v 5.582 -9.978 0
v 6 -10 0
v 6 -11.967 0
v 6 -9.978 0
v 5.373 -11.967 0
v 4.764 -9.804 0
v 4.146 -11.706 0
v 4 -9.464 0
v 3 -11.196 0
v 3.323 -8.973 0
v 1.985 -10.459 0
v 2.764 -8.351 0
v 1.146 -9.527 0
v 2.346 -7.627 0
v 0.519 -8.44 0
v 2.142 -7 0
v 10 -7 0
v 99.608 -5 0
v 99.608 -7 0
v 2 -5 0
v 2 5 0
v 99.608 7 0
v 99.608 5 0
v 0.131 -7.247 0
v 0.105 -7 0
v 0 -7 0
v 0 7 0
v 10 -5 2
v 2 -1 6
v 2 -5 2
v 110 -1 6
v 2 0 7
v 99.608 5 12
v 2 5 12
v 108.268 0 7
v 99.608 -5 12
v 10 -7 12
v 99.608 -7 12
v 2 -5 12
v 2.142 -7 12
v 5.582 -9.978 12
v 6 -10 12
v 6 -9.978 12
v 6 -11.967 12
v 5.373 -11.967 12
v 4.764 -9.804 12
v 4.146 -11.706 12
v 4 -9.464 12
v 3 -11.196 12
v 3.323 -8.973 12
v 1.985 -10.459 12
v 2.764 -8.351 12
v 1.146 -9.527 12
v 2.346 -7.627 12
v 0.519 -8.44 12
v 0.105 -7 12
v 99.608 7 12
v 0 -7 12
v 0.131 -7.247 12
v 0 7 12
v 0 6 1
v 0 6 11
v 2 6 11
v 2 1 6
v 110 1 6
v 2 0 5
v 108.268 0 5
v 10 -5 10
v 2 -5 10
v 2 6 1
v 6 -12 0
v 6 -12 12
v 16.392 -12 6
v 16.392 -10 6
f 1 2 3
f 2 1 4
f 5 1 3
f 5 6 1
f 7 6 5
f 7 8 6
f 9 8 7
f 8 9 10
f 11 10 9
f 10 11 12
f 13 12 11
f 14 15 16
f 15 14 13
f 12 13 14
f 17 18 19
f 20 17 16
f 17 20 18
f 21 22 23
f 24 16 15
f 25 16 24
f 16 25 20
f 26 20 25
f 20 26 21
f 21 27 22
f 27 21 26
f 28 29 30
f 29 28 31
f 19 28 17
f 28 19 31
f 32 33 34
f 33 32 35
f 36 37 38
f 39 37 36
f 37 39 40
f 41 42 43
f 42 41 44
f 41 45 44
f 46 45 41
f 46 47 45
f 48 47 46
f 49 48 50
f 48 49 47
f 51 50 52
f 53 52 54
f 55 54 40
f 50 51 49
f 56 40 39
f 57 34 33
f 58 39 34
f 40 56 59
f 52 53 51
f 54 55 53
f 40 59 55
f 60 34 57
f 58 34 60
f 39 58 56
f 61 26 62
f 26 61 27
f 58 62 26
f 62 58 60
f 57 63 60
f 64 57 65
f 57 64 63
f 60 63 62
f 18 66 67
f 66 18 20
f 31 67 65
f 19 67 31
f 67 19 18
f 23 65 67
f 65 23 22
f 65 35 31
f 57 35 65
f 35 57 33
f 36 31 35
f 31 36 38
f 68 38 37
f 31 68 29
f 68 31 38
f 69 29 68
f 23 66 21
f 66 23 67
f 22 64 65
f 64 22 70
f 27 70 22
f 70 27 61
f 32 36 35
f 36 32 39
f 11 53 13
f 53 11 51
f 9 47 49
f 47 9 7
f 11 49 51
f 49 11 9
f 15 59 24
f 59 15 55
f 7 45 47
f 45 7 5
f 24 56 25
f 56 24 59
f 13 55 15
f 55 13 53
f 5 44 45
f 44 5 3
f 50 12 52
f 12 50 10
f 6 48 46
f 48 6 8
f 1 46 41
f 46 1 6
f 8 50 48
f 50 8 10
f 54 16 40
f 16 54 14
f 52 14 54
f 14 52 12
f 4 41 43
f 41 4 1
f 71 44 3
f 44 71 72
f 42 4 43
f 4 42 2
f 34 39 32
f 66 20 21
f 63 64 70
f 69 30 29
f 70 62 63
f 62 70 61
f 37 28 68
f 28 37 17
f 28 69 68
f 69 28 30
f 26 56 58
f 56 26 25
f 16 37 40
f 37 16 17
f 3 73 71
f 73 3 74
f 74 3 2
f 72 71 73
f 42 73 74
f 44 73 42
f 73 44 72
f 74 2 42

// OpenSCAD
//
//  Pegs for robot mower perimeter wire
//
//  Should print as is, no support needed
//  Best material is probably ABS
//
//  Design by Egil Kvaleberg, 20 April 2016
//

peg_length = 110.0;
peg_wall = 2.0;
peg_width = 12.0;
peg_slot = 4.0;
// max degrees of overhang supported by printer/material. 45 is usually safe
max_overhang = 30.0; // degrees
tip_len = peg_width / (2*tan(max_overhang)); // BUG:
d = 1*0.01;

module bar(slant) {
    points = [
      [0,-peg_wall/2,0],
      [peg_length-tip_len,-peg_wall/2,0],
      [peg_length-tip_len,peg_wall/2,0],
      [0,peg_wall/2,0],
      [0,slant-peg_wall/2,peg_width],
      [peg_length-tip_len,slant-peg_wall/2,peg_width],
      [peg_length-tip_len,slant+peg_wall/2,peg_width],
      [0,slant+peg_wall/2,peg_width]];
    faces = [
      [0,1,2,3],  // bottom
      [4,5,1,0],  // front
      [7,6,5,4],  // top
      [5,6,2,1],  // right
      [6,7,3,2],  // back
      [7,4,0,3]]; // left          
    polyhedron(points, faces);
    translate([peg_length-tip_len, 0, 0]) tip(slant);
}
module tip(slant) {
    points = [
      [0,-peg_wall/2,0],
      [tip_len,slant/2-peg_wall/2,peg_width/2],
      [tip_len,slant/2+peg_wall/2,peg_width/2],
      [0,peg_wall/2,0],
      [0,slant-peg_wall/2,peg_width],
      [0,slant+peg_wall/2,peg_width]];
    faces = [
      [0,1,2,3],  // bottom
      [4,1,0],    // front
      [5,2,1,4],  // top
      [5,3,2],    // back
      [5,4,0,3]]; // left  
    polyhedron(points, faces);
}
translate([0, -peg_width/2, 0]) bar(peg_width);
translate([0, peg_width/2, 0])  bar(-peg_width);
translate([0, -peg_width/2, 0]) cube([peg_wall,peg_width,peg_width]);
translate([0, -peg_width/2-peg_wall/2, 0]) cube([2*peg_slot+peg_wall,peg_wall,peg_width]);
intersection() {
    translate([0, -peg_width, -d]) cube([peg_slot+peg_wall,peg_slot+peg_wall,peg_width+2*d]);
    translate([peg_slot+peg_wall, -peg_width/2, 0]) {
        difference() {
            cylinder(r=peg_slot+peg_wall, h=peg_width, $fn=30);
            translate([0,0,-d]) cylinder(r=peg_slot, h=peg_width+2*d, $fn=30);
        }
    }
}
translate([peg_slot+peg_wall, -peg_width/2-peg_slot-peg_wall/2, 0]) tip(0);
